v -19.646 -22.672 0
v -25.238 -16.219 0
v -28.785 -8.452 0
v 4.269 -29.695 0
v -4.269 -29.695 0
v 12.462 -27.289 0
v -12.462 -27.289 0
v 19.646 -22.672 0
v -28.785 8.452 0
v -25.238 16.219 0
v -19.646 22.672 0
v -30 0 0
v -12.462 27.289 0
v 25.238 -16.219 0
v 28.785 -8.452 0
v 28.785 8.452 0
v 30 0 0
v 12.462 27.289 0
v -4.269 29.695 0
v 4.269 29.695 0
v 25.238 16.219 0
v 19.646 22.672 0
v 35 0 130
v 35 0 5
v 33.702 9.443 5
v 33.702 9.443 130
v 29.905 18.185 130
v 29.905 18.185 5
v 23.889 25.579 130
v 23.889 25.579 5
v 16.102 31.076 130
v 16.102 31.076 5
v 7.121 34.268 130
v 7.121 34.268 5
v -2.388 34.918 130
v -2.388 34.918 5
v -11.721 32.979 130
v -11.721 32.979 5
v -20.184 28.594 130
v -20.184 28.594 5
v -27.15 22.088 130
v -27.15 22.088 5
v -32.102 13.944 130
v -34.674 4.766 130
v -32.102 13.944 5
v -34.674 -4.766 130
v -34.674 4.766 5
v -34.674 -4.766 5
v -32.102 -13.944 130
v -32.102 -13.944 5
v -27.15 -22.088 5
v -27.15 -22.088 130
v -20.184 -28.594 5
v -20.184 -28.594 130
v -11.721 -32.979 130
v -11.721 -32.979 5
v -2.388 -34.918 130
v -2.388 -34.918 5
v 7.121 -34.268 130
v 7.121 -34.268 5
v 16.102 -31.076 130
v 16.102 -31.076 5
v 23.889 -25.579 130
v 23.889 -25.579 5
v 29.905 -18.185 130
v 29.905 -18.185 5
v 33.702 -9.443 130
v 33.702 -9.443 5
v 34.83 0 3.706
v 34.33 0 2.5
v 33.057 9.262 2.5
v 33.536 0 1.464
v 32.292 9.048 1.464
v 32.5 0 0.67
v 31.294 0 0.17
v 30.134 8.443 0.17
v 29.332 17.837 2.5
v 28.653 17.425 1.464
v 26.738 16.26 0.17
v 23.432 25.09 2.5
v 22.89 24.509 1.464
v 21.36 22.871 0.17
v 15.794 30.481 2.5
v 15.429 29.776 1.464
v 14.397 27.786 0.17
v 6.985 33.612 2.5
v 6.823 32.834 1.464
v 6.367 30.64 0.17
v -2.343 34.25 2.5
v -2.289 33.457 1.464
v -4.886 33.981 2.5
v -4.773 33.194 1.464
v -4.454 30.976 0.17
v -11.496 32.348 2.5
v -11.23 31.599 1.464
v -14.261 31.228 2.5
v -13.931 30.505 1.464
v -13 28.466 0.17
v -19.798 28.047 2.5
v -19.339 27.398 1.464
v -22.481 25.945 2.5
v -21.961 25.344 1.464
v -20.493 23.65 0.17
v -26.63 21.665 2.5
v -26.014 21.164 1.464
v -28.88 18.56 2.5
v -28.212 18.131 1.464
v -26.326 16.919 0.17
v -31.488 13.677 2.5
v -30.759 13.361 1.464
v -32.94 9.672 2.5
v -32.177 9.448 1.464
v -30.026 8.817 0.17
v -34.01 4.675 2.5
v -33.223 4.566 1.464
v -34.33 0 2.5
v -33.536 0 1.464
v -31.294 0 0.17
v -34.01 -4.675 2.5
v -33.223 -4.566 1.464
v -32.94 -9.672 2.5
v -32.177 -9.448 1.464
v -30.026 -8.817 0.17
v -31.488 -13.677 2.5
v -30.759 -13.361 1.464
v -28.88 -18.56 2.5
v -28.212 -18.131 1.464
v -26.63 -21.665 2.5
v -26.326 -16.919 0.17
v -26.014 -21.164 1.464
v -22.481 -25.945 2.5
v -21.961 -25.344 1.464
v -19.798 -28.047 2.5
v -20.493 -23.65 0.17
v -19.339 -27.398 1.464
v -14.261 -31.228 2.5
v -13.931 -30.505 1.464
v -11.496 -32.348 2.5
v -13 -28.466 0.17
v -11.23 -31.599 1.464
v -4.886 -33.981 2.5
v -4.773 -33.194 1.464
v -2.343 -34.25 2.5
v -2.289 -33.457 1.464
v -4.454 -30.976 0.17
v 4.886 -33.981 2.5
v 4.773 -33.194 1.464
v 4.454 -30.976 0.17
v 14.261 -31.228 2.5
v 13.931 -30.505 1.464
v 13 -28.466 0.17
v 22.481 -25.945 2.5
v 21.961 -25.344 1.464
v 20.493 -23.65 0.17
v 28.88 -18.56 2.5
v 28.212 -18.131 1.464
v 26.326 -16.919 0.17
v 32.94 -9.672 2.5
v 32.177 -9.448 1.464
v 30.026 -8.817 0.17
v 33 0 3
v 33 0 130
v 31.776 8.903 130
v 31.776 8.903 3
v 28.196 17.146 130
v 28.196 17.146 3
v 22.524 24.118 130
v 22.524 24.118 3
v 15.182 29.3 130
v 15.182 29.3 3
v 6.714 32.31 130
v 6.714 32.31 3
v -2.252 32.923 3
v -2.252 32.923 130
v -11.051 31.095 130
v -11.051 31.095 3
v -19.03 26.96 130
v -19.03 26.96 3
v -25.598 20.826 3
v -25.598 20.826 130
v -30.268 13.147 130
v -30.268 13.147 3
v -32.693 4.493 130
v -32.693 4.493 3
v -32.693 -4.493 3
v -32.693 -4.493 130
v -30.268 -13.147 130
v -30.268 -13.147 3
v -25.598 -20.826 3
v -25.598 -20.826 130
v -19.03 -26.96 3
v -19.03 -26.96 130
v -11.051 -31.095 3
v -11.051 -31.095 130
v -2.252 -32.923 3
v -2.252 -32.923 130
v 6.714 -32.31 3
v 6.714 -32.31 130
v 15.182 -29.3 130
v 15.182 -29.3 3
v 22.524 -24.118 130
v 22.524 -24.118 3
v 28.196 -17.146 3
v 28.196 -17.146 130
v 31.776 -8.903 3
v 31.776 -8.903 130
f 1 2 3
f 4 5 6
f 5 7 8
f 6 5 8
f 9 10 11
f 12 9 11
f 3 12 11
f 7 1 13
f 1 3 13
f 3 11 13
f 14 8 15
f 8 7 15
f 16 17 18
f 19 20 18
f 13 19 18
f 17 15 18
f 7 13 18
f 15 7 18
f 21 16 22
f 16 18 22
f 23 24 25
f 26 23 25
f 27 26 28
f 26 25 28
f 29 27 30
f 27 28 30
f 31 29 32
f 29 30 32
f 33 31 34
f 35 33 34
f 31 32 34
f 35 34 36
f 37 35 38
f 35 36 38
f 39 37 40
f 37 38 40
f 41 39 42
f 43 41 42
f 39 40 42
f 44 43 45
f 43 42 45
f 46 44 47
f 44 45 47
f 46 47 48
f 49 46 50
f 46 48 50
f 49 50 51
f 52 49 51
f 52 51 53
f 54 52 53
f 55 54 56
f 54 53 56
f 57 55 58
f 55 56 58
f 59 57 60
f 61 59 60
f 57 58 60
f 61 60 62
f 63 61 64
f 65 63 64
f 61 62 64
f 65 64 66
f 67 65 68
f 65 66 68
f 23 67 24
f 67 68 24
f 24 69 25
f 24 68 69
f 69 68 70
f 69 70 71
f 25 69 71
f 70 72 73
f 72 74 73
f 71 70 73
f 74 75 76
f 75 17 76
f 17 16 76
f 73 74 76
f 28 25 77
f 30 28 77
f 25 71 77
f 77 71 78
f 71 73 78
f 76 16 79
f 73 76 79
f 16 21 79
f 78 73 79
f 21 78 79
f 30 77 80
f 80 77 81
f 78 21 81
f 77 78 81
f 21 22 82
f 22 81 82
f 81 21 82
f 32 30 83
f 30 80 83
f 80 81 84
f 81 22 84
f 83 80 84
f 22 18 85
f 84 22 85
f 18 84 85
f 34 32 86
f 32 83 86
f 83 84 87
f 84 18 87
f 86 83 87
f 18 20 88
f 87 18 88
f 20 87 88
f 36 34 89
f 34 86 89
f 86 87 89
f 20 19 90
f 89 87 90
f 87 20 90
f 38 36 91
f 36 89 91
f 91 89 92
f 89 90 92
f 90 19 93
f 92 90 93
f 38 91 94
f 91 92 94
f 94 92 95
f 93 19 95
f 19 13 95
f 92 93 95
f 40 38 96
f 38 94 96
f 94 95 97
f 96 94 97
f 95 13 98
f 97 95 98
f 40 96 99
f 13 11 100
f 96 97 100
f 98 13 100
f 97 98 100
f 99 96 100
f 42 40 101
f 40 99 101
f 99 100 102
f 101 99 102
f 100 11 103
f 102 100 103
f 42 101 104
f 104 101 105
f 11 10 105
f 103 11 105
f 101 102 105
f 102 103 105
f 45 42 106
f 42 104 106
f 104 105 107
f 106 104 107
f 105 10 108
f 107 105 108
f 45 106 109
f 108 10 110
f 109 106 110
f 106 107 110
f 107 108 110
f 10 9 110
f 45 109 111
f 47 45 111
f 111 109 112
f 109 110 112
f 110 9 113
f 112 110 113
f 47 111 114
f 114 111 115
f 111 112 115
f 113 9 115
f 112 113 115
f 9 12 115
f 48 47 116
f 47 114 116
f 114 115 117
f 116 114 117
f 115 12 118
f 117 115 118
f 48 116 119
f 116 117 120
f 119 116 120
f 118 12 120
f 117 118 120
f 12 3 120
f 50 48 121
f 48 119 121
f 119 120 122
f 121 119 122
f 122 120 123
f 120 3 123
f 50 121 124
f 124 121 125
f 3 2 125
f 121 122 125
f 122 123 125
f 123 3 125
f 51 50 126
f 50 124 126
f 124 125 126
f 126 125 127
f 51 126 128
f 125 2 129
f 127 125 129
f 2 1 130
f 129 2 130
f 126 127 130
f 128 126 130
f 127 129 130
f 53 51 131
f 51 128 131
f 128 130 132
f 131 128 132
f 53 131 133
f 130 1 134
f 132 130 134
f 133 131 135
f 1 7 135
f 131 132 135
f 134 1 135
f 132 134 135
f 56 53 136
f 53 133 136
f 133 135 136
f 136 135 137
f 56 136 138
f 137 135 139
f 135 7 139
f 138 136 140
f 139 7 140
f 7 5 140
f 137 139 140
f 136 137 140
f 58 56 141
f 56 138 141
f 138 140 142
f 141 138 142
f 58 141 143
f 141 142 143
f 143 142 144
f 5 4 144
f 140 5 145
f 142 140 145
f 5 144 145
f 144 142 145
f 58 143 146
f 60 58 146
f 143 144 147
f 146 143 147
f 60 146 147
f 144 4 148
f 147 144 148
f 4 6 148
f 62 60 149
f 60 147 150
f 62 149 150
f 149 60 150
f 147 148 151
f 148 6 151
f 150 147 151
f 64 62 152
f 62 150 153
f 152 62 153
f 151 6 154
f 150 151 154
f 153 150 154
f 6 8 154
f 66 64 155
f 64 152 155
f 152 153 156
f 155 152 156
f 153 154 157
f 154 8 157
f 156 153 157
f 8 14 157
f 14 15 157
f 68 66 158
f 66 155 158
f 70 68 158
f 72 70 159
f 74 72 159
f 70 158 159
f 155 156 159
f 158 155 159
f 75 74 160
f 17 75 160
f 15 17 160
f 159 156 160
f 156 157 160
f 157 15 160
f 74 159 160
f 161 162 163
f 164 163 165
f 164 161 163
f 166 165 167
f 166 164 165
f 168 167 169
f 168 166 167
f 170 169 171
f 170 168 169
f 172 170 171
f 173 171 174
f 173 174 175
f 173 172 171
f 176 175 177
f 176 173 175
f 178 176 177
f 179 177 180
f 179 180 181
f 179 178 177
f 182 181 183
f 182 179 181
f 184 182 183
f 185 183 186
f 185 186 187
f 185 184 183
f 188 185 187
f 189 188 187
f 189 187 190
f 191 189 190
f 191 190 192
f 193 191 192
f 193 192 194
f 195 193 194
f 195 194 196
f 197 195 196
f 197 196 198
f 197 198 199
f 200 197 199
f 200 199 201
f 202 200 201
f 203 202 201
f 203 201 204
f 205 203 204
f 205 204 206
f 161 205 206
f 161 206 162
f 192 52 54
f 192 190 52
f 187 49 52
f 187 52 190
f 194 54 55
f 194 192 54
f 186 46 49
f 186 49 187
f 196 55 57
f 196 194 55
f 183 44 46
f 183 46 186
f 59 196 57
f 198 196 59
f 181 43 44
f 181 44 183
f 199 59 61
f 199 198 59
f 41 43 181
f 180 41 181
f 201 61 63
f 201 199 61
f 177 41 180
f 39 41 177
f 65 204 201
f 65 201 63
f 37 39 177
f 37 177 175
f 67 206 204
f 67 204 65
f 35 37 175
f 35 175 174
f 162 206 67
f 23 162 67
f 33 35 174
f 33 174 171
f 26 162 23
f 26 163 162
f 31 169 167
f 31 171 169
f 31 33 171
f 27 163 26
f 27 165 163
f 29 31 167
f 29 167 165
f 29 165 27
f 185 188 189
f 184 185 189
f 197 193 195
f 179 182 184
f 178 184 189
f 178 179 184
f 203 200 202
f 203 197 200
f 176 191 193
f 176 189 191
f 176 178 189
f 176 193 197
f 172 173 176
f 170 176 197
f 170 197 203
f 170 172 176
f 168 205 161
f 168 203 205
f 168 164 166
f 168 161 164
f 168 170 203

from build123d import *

# Parameters (mm, degrees)
F0_R     = 35
F0_R_2   = 33
F1_DEPTH = 130
F2_R     = 35
F3_DEPTH = 3
F4_R     = 5


with BuildPart() as f1:
    # F0 (on Top) → F1 (new body)
    with BuildSketch(Plane.XY):
        Circle(F0_R)
        Circle(F0_R_2, mode=Mode.SUBTRACT)
    extrude(amount=F1_DEPTH)

    # F2 (on Top) → F3 (join)
    with BuildSketch(Plane.XY):
        Circle(F2_R)
    extrude(amount=F3_DEPTH)

    # F4
    f4_edges = [f1.edges().sort_by_distance(p)[0] for p in [
        (-35, 0, 0),
    ]]
    fillet(f4_edges, radius=F4_R)


solid = f1.part
